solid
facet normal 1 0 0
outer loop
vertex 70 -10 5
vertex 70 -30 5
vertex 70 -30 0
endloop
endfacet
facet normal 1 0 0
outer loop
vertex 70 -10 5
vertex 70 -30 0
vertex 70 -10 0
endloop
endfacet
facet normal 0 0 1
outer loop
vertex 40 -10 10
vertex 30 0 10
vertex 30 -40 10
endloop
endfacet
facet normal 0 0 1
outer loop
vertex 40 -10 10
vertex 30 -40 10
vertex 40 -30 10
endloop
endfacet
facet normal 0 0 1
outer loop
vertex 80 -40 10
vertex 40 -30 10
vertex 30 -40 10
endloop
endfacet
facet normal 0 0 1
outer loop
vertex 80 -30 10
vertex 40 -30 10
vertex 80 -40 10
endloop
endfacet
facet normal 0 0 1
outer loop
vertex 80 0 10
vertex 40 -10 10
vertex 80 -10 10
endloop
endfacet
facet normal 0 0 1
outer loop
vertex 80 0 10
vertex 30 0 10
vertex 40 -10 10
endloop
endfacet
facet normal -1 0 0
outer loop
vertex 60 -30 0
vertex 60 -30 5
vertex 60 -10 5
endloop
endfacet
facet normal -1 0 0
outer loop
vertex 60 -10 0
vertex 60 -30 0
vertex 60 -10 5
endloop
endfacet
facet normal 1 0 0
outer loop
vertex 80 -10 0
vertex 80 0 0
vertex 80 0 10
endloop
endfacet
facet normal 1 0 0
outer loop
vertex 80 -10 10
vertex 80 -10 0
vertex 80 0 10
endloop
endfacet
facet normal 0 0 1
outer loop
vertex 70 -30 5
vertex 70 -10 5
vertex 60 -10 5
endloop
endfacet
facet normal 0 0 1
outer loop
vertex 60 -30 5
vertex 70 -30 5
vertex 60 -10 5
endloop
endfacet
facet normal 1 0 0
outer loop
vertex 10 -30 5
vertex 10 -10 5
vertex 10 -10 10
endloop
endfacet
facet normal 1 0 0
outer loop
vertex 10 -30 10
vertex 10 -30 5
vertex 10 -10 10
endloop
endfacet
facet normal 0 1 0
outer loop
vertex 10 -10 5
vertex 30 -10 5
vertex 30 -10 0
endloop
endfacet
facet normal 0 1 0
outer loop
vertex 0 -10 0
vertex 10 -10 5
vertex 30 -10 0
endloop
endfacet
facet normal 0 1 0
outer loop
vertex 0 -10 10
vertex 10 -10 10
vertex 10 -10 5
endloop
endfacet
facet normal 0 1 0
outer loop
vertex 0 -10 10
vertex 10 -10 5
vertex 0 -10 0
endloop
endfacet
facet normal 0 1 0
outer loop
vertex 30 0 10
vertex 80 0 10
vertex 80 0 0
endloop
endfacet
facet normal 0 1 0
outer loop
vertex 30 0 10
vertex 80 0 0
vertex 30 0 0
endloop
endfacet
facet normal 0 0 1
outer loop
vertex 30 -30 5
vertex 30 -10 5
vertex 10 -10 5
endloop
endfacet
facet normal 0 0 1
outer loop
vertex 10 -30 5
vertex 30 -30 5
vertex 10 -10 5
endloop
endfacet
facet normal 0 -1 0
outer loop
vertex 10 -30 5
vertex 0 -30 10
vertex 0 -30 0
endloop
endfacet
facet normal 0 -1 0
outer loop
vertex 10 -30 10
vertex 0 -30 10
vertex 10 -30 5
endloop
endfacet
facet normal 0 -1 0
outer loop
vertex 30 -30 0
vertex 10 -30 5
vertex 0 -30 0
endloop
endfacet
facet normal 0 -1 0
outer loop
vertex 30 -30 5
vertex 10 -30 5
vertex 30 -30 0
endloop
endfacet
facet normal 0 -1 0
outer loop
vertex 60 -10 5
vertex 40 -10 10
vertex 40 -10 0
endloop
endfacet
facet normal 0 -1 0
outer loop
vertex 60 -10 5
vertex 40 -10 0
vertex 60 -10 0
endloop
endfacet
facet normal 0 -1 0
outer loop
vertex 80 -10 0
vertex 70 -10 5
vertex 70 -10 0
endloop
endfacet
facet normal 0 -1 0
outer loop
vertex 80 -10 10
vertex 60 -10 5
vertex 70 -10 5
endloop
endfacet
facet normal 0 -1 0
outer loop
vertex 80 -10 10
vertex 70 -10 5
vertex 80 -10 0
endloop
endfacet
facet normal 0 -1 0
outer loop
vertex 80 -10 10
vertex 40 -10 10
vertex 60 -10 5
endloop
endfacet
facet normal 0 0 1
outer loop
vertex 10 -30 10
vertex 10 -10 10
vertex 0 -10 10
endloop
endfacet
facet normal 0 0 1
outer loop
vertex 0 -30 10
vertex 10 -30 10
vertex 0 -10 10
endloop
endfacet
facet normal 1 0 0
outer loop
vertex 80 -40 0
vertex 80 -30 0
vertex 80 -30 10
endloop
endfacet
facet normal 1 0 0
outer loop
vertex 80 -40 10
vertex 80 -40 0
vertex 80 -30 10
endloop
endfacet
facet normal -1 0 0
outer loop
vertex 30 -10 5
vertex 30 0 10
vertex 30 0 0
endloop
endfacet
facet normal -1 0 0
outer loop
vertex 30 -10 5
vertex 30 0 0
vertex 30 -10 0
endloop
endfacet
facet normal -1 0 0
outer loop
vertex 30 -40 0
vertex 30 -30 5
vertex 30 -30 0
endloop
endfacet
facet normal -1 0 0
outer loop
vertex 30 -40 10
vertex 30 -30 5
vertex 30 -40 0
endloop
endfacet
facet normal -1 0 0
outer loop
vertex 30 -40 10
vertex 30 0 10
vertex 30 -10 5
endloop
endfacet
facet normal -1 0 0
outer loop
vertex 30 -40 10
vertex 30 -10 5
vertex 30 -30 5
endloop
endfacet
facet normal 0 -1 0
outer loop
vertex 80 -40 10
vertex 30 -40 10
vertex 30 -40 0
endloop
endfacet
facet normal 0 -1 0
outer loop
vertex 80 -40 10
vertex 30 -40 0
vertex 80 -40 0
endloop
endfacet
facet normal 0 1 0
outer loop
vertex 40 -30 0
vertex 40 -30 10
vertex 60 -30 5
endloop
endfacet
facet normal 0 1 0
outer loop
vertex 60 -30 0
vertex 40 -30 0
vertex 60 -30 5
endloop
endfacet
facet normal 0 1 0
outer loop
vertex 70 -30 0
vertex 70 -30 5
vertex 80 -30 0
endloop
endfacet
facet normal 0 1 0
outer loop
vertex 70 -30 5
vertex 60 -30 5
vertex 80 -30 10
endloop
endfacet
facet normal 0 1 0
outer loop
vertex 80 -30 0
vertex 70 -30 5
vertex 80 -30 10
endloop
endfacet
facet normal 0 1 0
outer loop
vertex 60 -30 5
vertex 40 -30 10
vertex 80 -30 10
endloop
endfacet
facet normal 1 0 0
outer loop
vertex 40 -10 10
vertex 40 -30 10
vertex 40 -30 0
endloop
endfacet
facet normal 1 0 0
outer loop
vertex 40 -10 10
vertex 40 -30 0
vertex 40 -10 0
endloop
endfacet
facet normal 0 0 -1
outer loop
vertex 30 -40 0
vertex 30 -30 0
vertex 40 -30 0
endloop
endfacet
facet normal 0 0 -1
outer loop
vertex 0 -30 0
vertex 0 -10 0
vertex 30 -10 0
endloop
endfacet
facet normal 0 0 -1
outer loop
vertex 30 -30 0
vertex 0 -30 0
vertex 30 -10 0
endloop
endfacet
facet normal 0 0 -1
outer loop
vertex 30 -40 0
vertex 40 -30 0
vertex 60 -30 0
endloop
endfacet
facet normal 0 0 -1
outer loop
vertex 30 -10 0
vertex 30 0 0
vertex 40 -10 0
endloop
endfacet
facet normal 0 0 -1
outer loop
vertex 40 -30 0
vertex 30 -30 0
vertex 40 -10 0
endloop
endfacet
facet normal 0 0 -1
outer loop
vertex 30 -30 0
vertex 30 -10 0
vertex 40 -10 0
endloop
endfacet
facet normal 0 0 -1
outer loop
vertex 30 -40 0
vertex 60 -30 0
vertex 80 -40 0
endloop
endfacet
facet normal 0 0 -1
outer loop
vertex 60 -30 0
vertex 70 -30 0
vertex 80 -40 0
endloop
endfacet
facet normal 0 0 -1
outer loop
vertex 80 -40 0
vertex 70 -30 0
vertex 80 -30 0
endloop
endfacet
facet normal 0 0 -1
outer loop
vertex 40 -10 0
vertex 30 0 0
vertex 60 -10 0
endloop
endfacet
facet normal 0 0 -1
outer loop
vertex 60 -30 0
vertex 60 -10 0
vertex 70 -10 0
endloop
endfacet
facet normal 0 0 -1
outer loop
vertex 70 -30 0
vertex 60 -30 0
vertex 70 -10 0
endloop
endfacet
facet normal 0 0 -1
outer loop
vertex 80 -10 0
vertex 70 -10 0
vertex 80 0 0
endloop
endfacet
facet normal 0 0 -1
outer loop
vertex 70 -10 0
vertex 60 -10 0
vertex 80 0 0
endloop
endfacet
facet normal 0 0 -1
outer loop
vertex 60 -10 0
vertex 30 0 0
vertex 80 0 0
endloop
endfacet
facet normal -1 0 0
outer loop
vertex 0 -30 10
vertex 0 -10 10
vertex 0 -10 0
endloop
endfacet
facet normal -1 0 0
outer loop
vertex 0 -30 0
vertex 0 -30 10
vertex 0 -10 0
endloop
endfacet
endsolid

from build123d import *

# Parameters (mm, degrees)
F1_DEPTH  = 40
F3_DEPTH  = 10
F5_DEPTH  = 10
F6_W      = 10
F6_H      = 20
F7_DEPTH  = 25
F6_W_2    = 30
F8_DEPTH  = 5
F9_W      = 20
F9_H      = 20
F10_DEPTH = 25
F11_DEPTH = 10


with BuildPart() as f1:
    # F0 (on Front) → F1 (new body)
    with BuildSketch(Plane.XZ):
        Polygon((0, 10), (0, 0), (80, 0), (80, 10), (40, 10), (40, 5), (10, 5), (10, 10), align=None)
    extrude(amount=F1_DEPTH)

    # F2 (on face) → F3 (cut)
    with BuildSketch(Plane.XZ.offset(40)):
        Polygon((10, 10), (0, 10), (0, 0), (40, 0), (40, 5), (10, 5), align=None)
    extrude(amount=-F3_DEPTH, mode=Mode.SUBTRACT)

    # F4 (on face) → F5 (cut)
    with BuildSketch(Plane(origin=(0, 0, 0), x_dir=(-1, 0, 0), z_dir=(0, 1, 0))):
        Polygon((-40, 0), (0, 0), (0, 10), (-10, 10), (-10, 5), (-40, 5), align=None)
    extrude(amount=-F5_DEPTH, mode=Mode.SUBTRACT)

    # F6 (on face) → F7 (cut)
    with BuildSketch(Plane.XY.offset(10)):
        with Locations((75, -20)):
            Rectangle(F6_W, F6_H)
    extrude(amount=-F7_DEPTH, mode=Mode.SUBTRACT)

    # F6 (on face) → F8 (cut)
    with BuildSketch(Plane.XY.offset(10)):
        with Locations((55, -20)):
            Rectangle(F6_W_2, F6_H)
    extrude(amount=-F8_DEPTH, mode=Mode.SUBTRACT)

    # F9 (on face) → F10 (cut)
    with BuildSketch(Plane.XY.offset(10)):
        with Locations((50, -20)):
            Rectangle(F9_W, F9_H)
    extrude(amount=-F10_DEPTH, mode=Mode.SUBTRACT)

    # F9 (on face) → F11 (join)
    with BuildSketch(Plane.XY.offset(10)):
        Polygon((30, -40), (40, -40), (40, -30), (40, -10), (40, 0), (30, 0), align=None)
    extrude(amount=-F11_DEPTH)


solid = f1.part
